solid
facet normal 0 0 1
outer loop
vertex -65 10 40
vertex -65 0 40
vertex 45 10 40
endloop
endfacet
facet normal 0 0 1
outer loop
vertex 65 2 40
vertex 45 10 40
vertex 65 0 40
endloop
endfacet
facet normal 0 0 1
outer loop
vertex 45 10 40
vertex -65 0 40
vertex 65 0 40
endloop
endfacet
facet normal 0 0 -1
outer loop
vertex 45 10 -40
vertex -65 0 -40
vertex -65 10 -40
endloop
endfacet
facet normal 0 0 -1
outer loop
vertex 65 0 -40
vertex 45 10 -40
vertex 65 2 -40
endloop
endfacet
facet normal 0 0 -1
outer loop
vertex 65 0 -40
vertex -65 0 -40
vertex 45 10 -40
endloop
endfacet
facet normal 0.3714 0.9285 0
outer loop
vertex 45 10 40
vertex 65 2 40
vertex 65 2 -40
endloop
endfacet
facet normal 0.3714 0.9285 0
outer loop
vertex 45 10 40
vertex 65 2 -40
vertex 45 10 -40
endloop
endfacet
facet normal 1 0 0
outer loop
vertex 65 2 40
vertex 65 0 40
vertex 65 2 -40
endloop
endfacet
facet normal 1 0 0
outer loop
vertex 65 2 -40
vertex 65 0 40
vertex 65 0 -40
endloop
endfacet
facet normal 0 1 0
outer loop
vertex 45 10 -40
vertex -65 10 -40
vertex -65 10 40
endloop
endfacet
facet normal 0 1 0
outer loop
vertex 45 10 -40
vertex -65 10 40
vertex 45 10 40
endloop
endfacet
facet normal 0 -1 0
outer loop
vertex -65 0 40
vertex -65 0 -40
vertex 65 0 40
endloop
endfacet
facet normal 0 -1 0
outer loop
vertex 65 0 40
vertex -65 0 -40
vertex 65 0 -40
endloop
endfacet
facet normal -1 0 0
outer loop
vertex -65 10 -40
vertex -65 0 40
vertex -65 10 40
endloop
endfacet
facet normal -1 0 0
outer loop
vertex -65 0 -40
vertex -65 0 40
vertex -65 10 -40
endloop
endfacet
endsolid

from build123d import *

# Parameters (mm, degrees)
SKETCH1_W           = 130
SKETCH1_H           = 80
BOSS_EXTRUDE1_DEPTH = 10
CUT_EXTRUDE1_DEPTH  = 81


with BuildPart() as part:
    # Sketch1 → Boss-Extrude1 (new body)
    with BuildSketch(Plane(origin=(0, 0, 0), x_dir=(1, 0, 0), z_dir=(0, 1, 0))):
        Rectangle(SKETCH1_W, SKETCH1_H)
    extrude(amount=BOSS_EXTRUDE1_DEPTH)

    # Sketch2 → Cut-Extrude1 (cut, through all)
    with BuildSketch(Plane.XY.offset(40)):
        Polygon((65, 2), (45, 10), (65, 10), align=None)
    extrude(amount=-CUT_EXTRUDE1_DEPTH, mode=Mode.SUBTRACT)


solid = part.part
